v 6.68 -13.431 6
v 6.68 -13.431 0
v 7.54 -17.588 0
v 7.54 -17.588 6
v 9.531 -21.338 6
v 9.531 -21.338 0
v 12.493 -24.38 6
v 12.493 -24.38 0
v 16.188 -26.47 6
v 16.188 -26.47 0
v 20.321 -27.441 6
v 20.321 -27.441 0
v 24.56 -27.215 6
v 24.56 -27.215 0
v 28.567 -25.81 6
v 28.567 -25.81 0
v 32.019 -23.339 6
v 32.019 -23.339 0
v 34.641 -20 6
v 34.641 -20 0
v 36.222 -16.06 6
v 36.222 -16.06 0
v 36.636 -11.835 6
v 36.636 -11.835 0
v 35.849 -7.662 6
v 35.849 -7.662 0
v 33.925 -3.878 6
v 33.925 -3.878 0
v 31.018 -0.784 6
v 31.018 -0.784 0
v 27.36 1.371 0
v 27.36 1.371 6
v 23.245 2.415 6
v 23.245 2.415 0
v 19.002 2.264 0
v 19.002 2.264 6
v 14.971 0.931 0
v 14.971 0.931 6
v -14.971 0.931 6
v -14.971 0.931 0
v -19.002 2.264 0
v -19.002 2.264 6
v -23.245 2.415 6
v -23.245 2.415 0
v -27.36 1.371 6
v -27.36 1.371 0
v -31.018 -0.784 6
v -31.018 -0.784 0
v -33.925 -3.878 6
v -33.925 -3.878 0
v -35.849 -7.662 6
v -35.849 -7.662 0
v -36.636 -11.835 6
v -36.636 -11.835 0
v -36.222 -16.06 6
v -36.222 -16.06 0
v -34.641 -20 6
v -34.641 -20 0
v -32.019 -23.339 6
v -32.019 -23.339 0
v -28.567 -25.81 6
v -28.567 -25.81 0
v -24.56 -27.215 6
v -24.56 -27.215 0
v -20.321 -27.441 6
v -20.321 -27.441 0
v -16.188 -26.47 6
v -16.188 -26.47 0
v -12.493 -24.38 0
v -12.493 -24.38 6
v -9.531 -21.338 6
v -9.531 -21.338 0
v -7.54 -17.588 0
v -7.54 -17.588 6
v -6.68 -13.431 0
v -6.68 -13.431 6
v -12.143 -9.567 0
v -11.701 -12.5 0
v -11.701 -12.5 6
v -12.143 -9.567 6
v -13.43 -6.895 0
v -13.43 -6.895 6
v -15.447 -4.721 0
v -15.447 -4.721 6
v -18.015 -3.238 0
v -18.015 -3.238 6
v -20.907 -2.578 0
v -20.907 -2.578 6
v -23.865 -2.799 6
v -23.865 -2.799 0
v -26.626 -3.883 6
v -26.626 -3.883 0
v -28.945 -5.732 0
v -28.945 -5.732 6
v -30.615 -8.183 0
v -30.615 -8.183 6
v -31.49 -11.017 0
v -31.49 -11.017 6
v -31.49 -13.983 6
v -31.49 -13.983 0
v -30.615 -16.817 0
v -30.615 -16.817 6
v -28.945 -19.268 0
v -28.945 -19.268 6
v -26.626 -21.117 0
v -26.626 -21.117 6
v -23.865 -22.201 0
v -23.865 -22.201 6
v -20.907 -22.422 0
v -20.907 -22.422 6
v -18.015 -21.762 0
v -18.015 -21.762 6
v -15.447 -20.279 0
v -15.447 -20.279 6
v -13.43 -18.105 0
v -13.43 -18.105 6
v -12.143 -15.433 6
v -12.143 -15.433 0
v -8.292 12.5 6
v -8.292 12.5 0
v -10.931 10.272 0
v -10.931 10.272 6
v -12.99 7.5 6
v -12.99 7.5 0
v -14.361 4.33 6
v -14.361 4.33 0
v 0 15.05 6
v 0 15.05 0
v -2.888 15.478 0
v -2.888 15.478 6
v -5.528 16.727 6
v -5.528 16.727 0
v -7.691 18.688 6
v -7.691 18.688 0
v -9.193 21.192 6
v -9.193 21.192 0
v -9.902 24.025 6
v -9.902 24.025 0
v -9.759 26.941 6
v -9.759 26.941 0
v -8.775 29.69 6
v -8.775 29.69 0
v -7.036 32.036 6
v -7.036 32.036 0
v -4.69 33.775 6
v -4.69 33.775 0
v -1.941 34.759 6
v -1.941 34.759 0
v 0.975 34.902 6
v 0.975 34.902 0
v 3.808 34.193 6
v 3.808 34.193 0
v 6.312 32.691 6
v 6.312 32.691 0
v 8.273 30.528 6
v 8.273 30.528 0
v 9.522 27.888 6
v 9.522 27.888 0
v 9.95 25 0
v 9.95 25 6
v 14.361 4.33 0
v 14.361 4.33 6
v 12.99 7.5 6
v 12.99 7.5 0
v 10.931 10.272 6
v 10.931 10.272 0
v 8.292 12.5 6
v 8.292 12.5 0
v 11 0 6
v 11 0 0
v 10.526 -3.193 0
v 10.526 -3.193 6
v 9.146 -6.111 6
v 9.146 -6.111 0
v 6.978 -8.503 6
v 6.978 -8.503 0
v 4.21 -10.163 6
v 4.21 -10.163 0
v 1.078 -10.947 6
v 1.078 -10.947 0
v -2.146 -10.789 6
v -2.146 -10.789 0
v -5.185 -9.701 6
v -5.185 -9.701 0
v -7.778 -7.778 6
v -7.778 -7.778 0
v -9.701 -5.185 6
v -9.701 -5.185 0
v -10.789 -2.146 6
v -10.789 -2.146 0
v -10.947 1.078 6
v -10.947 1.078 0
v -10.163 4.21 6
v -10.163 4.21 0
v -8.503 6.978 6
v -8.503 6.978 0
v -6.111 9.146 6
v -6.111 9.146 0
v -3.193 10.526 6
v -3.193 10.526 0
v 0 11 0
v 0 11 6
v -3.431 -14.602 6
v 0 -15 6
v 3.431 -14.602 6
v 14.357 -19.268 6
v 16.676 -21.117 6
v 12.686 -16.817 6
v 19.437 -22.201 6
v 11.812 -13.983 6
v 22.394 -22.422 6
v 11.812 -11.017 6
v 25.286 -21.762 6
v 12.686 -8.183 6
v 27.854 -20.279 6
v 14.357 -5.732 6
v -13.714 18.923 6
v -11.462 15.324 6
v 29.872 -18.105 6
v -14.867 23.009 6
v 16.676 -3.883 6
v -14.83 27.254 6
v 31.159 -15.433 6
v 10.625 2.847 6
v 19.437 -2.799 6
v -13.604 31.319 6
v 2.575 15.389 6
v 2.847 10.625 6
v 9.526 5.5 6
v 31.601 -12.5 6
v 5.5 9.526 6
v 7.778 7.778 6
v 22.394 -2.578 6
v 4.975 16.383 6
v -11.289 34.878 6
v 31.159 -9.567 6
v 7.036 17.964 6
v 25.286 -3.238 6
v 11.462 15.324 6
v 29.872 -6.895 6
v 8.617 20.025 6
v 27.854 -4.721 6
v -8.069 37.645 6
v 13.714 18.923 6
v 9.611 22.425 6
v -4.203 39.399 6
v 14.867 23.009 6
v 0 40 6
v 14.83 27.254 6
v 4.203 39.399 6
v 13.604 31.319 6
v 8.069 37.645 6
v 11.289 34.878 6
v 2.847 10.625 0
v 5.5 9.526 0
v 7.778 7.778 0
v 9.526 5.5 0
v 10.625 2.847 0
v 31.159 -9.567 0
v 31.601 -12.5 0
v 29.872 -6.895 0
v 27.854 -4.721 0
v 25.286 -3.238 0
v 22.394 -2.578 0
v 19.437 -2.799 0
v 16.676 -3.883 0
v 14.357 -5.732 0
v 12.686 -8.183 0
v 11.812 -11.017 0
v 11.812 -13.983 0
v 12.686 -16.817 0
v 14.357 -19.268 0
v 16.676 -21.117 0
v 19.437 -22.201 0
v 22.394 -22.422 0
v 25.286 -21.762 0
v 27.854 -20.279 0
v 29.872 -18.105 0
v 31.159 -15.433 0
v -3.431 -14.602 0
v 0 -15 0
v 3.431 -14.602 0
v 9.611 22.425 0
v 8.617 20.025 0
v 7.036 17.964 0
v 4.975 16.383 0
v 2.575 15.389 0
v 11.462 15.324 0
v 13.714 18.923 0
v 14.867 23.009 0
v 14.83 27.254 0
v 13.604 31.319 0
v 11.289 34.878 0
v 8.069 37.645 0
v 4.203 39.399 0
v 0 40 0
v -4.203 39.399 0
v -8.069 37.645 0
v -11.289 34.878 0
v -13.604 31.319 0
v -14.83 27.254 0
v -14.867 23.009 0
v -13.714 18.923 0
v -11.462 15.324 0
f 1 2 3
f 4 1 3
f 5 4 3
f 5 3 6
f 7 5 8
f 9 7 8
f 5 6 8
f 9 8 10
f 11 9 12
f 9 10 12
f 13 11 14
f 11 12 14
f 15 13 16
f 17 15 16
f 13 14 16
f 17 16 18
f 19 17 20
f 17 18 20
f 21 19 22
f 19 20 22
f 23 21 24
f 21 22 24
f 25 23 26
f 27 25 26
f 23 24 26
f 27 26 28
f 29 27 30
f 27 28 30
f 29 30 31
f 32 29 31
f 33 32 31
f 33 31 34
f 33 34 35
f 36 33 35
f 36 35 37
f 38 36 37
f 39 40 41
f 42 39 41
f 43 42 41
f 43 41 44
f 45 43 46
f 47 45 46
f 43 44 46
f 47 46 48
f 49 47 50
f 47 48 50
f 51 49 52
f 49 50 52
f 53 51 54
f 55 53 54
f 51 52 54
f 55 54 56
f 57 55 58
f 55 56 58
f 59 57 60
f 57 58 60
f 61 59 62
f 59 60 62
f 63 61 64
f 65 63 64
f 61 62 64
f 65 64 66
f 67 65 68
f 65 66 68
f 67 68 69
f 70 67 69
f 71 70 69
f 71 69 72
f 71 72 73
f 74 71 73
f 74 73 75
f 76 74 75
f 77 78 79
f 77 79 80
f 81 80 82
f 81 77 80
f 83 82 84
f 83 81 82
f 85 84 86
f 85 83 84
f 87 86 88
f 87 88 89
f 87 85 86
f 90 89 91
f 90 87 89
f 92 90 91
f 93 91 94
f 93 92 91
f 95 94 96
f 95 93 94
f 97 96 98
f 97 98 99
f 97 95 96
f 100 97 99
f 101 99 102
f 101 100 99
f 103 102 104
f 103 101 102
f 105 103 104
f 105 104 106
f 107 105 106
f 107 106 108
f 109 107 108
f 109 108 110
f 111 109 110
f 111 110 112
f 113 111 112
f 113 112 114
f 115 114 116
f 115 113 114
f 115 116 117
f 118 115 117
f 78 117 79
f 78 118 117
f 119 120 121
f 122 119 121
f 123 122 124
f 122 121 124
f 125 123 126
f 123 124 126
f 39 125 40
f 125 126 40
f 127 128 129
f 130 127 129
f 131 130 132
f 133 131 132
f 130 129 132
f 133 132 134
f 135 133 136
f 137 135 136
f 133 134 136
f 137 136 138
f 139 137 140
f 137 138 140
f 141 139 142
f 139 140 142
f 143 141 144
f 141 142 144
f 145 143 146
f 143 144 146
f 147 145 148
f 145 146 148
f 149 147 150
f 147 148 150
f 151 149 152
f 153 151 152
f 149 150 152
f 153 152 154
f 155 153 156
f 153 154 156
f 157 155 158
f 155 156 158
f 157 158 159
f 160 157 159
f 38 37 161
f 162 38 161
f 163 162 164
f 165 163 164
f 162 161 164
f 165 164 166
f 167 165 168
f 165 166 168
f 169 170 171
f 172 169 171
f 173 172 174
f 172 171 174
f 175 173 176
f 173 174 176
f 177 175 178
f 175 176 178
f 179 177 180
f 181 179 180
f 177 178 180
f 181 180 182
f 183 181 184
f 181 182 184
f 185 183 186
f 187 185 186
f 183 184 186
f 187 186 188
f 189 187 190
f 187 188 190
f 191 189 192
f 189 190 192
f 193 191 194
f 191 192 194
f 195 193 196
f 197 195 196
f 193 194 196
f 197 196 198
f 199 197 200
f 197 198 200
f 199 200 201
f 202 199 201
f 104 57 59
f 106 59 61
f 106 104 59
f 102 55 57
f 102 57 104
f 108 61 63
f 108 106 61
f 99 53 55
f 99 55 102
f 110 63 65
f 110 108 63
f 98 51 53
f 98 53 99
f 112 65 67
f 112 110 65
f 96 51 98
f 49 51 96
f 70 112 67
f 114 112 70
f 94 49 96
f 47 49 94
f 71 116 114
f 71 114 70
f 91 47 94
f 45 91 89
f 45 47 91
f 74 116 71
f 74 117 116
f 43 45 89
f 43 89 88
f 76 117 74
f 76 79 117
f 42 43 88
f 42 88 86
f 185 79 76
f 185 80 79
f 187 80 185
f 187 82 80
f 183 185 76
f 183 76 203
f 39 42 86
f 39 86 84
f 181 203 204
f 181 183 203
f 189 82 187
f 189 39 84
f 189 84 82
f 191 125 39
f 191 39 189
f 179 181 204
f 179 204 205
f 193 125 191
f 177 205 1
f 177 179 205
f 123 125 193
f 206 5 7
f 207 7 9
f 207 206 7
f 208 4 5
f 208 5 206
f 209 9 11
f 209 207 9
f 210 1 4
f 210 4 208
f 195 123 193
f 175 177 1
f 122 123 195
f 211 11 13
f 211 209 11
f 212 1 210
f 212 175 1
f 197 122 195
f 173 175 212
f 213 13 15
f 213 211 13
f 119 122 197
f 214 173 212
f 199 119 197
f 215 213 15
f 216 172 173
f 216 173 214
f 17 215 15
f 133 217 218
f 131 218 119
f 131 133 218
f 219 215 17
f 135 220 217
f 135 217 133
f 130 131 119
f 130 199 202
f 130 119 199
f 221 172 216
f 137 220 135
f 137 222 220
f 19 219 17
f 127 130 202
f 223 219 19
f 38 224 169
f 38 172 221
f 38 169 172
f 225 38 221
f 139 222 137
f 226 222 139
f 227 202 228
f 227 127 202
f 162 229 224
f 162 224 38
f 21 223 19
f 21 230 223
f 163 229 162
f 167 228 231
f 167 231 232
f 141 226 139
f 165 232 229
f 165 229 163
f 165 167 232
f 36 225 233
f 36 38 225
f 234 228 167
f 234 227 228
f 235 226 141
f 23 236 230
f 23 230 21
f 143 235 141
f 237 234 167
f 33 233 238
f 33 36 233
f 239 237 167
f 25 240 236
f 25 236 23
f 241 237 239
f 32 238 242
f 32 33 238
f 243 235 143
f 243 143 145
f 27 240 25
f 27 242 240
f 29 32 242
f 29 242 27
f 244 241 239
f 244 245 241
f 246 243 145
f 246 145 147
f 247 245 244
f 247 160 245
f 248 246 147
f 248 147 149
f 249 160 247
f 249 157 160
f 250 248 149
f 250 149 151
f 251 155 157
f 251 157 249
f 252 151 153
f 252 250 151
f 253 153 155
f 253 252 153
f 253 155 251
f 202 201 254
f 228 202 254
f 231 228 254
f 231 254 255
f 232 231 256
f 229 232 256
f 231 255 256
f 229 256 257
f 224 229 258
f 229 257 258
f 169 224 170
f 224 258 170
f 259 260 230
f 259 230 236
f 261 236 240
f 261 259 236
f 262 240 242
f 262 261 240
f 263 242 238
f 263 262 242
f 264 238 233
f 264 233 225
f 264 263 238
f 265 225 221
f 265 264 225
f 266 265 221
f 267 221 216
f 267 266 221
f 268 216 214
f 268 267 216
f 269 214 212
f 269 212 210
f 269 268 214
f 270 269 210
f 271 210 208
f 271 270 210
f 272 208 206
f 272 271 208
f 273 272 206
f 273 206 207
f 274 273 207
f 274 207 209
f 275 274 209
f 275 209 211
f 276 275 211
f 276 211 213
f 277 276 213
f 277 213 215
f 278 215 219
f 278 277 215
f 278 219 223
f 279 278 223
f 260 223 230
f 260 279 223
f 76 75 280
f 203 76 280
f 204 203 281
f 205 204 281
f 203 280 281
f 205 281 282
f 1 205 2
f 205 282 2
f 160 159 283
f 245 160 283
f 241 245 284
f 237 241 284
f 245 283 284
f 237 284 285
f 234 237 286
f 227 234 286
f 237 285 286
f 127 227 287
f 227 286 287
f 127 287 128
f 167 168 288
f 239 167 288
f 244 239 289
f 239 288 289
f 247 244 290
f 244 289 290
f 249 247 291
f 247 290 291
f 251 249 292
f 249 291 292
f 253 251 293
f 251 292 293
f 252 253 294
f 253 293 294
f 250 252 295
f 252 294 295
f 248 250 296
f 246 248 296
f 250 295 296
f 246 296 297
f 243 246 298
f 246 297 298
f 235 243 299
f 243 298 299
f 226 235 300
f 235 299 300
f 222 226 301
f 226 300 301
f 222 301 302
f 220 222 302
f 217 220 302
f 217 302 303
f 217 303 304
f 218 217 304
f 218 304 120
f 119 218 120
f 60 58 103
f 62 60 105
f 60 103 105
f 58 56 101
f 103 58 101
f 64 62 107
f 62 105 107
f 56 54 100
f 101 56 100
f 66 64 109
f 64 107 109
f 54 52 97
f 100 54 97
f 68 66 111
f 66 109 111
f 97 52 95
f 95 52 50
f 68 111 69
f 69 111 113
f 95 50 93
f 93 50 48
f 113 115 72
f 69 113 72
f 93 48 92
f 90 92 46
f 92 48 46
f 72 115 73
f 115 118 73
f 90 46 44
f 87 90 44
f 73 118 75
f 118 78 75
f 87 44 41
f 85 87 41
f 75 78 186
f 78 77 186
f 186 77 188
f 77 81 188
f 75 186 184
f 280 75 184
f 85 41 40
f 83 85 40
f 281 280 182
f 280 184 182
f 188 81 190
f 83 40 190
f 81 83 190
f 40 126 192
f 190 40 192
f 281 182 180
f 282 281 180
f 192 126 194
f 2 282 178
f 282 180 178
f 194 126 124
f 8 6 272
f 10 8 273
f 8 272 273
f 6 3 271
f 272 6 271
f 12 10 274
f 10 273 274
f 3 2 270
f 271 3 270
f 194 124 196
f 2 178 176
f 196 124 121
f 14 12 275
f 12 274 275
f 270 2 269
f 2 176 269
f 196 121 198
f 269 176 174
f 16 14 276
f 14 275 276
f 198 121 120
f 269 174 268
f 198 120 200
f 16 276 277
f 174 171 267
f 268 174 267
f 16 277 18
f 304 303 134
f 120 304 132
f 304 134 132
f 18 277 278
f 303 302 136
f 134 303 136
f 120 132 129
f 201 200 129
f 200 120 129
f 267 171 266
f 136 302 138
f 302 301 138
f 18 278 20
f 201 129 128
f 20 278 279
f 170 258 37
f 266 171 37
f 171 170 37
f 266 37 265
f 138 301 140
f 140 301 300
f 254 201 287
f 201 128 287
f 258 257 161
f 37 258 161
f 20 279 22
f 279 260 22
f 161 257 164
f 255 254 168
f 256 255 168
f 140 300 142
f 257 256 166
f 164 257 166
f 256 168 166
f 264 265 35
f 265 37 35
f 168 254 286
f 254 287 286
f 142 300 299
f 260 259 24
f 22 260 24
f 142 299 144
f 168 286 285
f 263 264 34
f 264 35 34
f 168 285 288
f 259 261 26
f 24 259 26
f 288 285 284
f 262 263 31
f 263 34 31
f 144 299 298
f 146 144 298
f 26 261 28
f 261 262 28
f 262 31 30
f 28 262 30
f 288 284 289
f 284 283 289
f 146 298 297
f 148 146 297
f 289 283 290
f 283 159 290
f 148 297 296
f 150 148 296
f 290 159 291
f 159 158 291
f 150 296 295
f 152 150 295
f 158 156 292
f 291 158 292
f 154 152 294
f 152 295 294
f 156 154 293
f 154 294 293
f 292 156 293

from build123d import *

# Parameters (mm, degrees)
F0_R     = 9.95
F1_DEPTH = 6


with BuildPart() as f1:
    # F0 (on Top) → F1 (new body)
    with BuildSketch(Plane.XY):
        with BuildLine():
            ThreePointArc((0, 11), (-7.778175, -7.778175), (11, 0))
            ThreePointArc((11, 0), (7.778175, 7.778175), (0, 11))
        make_face()
        with BuildLine():
            ThreePointArc((9.95, 25), (-7.035712, 32.035712), (0, 15.05))
            ThreePointArc((0, 15.05), (7.035712, 17.964288), (9.95, 25))
        make_face()
        with BuildLine():
            ThreePointArc((8.291562, 12.5), (0, 40), (-8.291562, 12.5))
            ThreePointArc((-8.291562, 12.5), (-12.990381, 7.5), (-14.971099, 0.930703))
            ThreePointArc((-14.971099, 0.930703), (-34.641016, -20), (-6.679537, -13.430703))
            ThreePointArc((-6.679537, -13.430703), (0, -15), (6.679537, -13.430703))
            ThreePointArc((6.679537, -13.430703), (34.641016, -20), (14.971099, 0.930703))
            ThreePointArc((14.971099, 0.930703), (12.990381, 7.5), (8.291562, 12.5))
        make_face()
        with Locations((-21.650635, -12.5)):
            Circle(F0_R, mode=Mode.SUBTRACT)
        with Locations((21.650635, -12.5)):
            Circle(F0_R, mode=Mode.SUBTRACT)
        with BuildLine():
            ThreePointArc((0, 11), (7.778175, 7.778175), (11, 0))
            ThreePointArc((11, 0), (-7.778175, -7.778175), (0, 11))
        make_face(mode=Mode.SUBTRACT)
        with BuildLine():
            ThreePointArc((9.95, 25), (7.035712, 17.964288), (0, 15.05))
            ThreePointArc((0, 15.05), (-7.035712, 32.035712), (9.95, 25))
        make_face(mode=Mode.SUBTRACT)
    extrude(amount=F1_DEPTH)


solid = f1.part
